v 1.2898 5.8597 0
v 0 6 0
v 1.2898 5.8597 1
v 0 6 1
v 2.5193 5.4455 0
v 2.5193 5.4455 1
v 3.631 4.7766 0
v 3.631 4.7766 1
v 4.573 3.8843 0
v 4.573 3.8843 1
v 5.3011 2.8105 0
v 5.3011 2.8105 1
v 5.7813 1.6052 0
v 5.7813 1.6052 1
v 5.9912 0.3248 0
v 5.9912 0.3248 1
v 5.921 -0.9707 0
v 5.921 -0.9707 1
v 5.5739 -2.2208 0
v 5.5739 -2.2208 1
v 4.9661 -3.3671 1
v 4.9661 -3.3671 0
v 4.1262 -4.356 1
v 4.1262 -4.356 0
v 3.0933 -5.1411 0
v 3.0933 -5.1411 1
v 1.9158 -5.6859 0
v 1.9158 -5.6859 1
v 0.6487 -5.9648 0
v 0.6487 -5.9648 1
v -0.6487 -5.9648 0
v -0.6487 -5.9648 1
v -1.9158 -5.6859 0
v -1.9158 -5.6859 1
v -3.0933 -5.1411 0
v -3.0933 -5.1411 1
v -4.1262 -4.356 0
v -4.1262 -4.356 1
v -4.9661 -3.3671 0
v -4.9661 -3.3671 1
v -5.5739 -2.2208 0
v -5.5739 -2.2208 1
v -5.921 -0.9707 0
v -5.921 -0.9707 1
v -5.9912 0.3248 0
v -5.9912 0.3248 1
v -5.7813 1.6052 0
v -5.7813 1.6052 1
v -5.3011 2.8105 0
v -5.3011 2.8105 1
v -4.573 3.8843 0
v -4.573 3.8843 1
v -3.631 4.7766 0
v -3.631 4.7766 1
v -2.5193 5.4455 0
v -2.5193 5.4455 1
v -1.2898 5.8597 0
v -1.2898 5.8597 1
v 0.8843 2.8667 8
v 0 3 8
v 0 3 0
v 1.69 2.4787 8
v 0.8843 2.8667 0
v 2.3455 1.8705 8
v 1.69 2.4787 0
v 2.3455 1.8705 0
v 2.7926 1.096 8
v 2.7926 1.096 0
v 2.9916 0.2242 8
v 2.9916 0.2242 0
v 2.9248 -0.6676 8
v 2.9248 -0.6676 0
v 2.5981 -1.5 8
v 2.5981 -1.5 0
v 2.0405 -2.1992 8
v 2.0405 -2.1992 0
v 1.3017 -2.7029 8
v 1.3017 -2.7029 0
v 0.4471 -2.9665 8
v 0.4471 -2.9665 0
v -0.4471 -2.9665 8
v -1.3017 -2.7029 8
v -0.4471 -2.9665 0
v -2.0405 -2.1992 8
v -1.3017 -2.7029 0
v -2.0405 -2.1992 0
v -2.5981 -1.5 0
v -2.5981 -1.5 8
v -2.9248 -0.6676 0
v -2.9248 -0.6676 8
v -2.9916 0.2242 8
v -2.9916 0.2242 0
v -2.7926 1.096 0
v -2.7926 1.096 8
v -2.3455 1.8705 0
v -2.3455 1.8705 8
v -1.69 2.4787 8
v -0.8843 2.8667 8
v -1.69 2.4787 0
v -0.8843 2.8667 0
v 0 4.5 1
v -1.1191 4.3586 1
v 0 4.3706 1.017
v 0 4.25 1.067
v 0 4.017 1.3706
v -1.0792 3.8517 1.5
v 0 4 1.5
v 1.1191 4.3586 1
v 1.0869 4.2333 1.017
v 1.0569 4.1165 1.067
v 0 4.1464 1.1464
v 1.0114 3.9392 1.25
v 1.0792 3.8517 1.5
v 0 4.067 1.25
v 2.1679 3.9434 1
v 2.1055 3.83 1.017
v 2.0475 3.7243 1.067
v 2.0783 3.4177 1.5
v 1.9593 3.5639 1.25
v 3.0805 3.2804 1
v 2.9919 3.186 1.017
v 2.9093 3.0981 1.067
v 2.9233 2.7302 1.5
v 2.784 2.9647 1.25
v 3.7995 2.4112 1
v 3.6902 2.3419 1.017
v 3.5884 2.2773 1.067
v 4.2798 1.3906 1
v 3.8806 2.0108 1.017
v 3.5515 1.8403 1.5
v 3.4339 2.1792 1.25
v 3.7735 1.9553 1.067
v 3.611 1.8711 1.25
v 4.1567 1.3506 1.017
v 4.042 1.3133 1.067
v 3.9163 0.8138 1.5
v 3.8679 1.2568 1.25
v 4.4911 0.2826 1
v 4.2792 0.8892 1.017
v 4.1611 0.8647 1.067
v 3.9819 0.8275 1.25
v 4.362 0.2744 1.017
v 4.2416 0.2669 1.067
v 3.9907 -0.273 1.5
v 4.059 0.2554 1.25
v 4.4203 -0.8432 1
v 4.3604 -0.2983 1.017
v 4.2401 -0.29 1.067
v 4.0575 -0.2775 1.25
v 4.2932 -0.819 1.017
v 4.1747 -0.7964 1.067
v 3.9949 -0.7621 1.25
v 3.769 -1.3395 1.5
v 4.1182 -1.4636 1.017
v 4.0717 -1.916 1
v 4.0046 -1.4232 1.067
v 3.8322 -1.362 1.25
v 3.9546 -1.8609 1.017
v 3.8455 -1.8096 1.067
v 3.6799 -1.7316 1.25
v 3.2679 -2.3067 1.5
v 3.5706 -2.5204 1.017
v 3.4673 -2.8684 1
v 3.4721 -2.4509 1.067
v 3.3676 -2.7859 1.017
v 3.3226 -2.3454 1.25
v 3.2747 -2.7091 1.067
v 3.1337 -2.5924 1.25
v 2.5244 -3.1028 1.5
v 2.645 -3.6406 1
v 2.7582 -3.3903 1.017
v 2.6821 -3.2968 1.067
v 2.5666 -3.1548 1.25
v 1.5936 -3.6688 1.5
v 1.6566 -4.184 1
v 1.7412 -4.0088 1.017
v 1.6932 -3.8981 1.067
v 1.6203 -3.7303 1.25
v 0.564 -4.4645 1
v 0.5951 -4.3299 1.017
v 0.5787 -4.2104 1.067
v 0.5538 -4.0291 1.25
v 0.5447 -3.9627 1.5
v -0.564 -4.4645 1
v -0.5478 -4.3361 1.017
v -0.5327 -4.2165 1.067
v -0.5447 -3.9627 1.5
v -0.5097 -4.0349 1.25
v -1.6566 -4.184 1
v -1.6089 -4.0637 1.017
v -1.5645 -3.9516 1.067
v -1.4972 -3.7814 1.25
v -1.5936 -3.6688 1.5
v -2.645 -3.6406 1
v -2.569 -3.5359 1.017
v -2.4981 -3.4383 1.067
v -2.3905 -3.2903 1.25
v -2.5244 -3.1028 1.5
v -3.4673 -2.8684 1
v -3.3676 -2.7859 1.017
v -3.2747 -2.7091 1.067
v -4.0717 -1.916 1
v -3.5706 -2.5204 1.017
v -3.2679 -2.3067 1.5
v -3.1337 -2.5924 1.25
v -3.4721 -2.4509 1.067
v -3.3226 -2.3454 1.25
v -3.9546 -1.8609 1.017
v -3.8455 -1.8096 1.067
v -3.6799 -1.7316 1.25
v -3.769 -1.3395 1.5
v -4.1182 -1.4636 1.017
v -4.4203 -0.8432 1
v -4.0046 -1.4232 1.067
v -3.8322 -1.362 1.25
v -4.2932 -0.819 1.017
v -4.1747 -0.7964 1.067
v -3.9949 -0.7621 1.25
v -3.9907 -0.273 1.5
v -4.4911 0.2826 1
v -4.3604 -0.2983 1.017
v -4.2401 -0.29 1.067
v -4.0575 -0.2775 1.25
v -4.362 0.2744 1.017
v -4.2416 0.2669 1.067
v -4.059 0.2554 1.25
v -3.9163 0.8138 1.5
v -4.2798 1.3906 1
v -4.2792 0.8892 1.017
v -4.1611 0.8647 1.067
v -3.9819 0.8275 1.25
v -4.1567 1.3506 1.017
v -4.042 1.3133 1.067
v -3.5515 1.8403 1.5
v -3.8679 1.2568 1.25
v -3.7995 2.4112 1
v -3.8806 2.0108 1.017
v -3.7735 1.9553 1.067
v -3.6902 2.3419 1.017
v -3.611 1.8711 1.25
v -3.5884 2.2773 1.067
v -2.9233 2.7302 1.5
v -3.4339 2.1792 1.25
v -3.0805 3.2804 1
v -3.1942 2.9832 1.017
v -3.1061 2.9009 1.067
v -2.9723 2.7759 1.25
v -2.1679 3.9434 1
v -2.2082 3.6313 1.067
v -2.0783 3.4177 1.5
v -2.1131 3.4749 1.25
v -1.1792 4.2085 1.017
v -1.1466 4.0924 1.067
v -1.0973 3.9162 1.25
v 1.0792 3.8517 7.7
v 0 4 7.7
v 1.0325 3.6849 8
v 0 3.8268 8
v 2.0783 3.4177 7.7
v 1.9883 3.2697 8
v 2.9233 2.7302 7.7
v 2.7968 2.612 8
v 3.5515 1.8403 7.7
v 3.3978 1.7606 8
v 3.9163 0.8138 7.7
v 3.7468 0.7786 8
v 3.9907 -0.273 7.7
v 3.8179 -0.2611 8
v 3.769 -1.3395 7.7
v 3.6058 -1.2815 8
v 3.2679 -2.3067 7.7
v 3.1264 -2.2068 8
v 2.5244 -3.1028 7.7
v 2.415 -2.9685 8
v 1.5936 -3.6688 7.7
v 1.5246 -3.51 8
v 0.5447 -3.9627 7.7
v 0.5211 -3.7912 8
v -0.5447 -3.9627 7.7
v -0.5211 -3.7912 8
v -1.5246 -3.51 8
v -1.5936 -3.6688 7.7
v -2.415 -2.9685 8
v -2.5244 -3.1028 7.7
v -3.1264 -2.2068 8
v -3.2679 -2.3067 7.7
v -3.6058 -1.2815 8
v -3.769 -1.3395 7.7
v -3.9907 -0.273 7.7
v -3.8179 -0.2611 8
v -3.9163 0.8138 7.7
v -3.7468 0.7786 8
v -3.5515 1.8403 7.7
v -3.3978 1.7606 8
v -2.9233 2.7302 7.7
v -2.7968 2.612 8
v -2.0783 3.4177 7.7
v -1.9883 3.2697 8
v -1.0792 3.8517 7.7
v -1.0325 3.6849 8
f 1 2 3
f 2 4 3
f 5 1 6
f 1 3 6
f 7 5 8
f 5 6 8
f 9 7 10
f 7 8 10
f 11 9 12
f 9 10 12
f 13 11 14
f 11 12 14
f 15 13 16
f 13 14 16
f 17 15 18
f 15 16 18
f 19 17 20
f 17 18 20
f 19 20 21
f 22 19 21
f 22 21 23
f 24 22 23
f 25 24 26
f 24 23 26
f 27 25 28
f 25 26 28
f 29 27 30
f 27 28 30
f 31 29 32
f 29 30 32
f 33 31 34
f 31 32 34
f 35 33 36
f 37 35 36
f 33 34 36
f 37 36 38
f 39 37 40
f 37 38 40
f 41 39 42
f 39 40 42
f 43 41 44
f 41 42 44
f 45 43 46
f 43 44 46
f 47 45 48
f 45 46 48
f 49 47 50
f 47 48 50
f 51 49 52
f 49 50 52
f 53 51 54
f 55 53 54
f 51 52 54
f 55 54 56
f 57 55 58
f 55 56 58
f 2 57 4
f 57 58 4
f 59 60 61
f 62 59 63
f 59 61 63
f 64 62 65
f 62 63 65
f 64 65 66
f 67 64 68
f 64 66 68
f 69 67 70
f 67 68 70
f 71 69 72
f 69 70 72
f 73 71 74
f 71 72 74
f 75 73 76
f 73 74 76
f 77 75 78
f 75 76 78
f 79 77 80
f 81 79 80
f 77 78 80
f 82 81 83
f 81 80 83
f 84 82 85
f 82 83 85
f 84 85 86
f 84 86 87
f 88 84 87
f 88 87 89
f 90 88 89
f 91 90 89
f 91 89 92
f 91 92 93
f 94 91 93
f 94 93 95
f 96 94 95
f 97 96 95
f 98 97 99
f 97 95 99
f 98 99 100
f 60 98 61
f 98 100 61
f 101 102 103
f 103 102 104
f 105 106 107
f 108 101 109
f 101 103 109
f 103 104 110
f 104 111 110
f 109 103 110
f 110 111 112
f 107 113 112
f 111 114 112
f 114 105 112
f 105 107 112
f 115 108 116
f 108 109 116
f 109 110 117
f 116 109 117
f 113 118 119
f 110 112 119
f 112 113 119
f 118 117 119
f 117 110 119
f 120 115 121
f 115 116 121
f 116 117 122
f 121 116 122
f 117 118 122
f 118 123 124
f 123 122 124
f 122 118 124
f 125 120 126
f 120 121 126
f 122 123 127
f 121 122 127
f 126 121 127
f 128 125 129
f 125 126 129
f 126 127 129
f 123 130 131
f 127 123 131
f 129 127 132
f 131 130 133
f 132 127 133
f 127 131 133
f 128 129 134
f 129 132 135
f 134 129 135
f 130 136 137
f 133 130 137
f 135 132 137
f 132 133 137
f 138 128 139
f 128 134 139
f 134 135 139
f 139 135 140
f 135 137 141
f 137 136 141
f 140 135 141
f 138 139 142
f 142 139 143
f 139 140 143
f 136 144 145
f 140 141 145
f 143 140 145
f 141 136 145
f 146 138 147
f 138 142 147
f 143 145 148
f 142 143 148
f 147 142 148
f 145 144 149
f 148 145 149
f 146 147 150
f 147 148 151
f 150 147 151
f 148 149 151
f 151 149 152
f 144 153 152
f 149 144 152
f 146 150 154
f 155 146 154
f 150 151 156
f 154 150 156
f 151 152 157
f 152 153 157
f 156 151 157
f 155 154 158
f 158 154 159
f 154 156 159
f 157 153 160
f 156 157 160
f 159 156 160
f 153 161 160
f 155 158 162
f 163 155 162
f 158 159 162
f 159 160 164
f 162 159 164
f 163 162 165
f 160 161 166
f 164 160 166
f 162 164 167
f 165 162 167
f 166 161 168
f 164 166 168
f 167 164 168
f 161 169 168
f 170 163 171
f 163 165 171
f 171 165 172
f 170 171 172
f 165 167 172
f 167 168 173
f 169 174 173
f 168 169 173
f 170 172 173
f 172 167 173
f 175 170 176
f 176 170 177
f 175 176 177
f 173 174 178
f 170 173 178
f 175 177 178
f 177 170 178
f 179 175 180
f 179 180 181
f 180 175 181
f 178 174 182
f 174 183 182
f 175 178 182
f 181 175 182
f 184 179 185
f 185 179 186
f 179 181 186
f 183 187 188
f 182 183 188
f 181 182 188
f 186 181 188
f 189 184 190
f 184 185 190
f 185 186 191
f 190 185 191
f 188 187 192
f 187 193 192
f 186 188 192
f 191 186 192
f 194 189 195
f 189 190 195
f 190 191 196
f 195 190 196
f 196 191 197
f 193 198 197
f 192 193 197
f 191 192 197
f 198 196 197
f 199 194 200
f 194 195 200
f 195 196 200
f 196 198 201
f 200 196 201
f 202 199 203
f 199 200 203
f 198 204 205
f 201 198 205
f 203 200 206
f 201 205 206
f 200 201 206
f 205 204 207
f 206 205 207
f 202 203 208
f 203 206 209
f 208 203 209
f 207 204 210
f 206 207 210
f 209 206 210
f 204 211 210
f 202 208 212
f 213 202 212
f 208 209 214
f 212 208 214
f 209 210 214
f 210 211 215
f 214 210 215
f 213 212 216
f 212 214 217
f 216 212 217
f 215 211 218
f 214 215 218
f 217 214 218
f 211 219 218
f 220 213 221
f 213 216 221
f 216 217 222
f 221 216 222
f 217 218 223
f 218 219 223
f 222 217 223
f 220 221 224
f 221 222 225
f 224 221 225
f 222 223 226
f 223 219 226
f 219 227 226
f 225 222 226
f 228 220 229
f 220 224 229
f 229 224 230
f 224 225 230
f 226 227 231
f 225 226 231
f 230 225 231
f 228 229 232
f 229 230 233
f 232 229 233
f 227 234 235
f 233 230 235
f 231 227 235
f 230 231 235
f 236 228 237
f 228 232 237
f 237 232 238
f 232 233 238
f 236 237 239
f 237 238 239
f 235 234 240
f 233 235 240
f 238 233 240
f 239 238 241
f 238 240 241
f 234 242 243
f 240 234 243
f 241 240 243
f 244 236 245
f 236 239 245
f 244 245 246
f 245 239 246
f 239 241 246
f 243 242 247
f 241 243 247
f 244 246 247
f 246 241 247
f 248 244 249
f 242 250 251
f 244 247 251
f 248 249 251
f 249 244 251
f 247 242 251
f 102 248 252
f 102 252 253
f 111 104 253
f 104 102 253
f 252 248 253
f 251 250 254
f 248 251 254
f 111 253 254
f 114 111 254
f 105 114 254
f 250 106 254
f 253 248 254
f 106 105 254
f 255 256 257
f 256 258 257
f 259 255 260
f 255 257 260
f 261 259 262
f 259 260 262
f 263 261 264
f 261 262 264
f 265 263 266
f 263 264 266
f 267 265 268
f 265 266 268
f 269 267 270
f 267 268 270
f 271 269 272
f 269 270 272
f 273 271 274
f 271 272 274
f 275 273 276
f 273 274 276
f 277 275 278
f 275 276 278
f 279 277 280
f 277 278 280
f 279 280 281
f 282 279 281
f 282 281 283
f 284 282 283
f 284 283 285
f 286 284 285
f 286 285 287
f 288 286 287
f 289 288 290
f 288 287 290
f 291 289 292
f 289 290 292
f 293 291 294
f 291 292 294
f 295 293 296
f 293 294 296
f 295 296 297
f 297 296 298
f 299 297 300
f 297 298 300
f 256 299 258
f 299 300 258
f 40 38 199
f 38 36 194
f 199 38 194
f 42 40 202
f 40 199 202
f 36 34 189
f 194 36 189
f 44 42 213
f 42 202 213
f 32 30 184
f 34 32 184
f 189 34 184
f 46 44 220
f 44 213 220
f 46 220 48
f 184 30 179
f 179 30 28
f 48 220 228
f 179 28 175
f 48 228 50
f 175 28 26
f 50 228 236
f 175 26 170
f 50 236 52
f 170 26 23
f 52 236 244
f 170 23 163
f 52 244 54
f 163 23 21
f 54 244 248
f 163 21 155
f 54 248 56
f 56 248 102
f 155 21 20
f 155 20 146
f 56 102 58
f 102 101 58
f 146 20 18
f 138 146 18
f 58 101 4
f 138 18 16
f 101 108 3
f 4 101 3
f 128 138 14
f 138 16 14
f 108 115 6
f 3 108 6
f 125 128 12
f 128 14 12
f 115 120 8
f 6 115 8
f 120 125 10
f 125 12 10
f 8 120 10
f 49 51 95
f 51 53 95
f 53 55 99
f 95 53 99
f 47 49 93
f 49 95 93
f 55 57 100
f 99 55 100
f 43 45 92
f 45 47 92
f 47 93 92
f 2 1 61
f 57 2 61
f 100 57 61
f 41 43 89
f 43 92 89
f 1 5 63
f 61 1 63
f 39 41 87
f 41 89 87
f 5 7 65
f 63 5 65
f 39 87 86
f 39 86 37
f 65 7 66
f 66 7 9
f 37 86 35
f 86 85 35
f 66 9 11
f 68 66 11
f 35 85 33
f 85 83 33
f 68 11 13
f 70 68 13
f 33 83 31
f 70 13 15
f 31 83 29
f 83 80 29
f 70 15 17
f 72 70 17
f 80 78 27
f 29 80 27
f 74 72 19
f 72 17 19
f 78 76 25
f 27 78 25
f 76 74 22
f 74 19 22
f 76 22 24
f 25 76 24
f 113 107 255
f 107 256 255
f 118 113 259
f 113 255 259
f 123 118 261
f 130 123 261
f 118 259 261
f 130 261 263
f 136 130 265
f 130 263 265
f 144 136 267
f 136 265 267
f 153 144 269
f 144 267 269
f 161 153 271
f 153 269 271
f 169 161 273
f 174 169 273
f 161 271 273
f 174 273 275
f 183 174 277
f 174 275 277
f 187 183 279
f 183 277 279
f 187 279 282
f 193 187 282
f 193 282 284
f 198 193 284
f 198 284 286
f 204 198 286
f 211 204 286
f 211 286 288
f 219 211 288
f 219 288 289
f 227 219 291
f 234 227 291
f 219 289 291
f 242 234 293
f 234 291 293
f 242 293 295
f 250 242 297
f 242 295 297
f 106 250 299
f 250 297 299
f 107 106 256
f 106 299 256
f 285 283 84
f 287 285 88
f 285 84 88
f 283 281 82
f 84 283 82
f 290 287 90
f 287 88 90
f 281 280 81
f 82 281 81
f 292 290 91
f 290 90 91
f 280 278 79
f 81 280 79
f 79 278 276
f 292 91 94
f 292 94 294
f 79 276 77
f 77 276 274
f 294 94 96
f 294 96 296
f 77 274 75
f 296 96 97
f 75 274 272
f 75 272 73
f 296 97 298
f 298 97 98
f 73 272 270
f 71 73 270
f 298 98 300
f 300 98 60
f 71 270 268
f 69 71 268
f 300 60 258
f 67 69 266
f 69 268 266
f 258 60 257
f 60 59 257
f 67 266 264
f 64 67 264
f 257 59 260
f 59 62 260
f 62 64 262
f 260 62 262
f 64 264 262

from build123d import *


with BuildPart() as part:
    # Sketch1 → Revolve1 (revolve)
    with BuildSketch(Plane(origin=(0, 0, 0), x_dir=(0, 0, -1), z_dir=(1, 0, 0))):
        with BuildLine():
            Line((0, 6), (-1, 6))
            Line((-1, 6), (-1, 4.5))
            ThreePointArc((-1, 4.5), (-1.146446609, 4.146446609), (-1.5, 4))
            Line((-1.5, 4), (-7.7, 4))
            Line((-7.7, 4), (-8, 3.826794919))
            Line((-8, 3.826794919), (-8, 3))
            Line((-8, 3), (0, 3))
            Line((0, 3), (0, 6))
        make_face()
    revolve(axis=Axis((0, 0, 0), (0, 0, -1)))


solid = part.part
